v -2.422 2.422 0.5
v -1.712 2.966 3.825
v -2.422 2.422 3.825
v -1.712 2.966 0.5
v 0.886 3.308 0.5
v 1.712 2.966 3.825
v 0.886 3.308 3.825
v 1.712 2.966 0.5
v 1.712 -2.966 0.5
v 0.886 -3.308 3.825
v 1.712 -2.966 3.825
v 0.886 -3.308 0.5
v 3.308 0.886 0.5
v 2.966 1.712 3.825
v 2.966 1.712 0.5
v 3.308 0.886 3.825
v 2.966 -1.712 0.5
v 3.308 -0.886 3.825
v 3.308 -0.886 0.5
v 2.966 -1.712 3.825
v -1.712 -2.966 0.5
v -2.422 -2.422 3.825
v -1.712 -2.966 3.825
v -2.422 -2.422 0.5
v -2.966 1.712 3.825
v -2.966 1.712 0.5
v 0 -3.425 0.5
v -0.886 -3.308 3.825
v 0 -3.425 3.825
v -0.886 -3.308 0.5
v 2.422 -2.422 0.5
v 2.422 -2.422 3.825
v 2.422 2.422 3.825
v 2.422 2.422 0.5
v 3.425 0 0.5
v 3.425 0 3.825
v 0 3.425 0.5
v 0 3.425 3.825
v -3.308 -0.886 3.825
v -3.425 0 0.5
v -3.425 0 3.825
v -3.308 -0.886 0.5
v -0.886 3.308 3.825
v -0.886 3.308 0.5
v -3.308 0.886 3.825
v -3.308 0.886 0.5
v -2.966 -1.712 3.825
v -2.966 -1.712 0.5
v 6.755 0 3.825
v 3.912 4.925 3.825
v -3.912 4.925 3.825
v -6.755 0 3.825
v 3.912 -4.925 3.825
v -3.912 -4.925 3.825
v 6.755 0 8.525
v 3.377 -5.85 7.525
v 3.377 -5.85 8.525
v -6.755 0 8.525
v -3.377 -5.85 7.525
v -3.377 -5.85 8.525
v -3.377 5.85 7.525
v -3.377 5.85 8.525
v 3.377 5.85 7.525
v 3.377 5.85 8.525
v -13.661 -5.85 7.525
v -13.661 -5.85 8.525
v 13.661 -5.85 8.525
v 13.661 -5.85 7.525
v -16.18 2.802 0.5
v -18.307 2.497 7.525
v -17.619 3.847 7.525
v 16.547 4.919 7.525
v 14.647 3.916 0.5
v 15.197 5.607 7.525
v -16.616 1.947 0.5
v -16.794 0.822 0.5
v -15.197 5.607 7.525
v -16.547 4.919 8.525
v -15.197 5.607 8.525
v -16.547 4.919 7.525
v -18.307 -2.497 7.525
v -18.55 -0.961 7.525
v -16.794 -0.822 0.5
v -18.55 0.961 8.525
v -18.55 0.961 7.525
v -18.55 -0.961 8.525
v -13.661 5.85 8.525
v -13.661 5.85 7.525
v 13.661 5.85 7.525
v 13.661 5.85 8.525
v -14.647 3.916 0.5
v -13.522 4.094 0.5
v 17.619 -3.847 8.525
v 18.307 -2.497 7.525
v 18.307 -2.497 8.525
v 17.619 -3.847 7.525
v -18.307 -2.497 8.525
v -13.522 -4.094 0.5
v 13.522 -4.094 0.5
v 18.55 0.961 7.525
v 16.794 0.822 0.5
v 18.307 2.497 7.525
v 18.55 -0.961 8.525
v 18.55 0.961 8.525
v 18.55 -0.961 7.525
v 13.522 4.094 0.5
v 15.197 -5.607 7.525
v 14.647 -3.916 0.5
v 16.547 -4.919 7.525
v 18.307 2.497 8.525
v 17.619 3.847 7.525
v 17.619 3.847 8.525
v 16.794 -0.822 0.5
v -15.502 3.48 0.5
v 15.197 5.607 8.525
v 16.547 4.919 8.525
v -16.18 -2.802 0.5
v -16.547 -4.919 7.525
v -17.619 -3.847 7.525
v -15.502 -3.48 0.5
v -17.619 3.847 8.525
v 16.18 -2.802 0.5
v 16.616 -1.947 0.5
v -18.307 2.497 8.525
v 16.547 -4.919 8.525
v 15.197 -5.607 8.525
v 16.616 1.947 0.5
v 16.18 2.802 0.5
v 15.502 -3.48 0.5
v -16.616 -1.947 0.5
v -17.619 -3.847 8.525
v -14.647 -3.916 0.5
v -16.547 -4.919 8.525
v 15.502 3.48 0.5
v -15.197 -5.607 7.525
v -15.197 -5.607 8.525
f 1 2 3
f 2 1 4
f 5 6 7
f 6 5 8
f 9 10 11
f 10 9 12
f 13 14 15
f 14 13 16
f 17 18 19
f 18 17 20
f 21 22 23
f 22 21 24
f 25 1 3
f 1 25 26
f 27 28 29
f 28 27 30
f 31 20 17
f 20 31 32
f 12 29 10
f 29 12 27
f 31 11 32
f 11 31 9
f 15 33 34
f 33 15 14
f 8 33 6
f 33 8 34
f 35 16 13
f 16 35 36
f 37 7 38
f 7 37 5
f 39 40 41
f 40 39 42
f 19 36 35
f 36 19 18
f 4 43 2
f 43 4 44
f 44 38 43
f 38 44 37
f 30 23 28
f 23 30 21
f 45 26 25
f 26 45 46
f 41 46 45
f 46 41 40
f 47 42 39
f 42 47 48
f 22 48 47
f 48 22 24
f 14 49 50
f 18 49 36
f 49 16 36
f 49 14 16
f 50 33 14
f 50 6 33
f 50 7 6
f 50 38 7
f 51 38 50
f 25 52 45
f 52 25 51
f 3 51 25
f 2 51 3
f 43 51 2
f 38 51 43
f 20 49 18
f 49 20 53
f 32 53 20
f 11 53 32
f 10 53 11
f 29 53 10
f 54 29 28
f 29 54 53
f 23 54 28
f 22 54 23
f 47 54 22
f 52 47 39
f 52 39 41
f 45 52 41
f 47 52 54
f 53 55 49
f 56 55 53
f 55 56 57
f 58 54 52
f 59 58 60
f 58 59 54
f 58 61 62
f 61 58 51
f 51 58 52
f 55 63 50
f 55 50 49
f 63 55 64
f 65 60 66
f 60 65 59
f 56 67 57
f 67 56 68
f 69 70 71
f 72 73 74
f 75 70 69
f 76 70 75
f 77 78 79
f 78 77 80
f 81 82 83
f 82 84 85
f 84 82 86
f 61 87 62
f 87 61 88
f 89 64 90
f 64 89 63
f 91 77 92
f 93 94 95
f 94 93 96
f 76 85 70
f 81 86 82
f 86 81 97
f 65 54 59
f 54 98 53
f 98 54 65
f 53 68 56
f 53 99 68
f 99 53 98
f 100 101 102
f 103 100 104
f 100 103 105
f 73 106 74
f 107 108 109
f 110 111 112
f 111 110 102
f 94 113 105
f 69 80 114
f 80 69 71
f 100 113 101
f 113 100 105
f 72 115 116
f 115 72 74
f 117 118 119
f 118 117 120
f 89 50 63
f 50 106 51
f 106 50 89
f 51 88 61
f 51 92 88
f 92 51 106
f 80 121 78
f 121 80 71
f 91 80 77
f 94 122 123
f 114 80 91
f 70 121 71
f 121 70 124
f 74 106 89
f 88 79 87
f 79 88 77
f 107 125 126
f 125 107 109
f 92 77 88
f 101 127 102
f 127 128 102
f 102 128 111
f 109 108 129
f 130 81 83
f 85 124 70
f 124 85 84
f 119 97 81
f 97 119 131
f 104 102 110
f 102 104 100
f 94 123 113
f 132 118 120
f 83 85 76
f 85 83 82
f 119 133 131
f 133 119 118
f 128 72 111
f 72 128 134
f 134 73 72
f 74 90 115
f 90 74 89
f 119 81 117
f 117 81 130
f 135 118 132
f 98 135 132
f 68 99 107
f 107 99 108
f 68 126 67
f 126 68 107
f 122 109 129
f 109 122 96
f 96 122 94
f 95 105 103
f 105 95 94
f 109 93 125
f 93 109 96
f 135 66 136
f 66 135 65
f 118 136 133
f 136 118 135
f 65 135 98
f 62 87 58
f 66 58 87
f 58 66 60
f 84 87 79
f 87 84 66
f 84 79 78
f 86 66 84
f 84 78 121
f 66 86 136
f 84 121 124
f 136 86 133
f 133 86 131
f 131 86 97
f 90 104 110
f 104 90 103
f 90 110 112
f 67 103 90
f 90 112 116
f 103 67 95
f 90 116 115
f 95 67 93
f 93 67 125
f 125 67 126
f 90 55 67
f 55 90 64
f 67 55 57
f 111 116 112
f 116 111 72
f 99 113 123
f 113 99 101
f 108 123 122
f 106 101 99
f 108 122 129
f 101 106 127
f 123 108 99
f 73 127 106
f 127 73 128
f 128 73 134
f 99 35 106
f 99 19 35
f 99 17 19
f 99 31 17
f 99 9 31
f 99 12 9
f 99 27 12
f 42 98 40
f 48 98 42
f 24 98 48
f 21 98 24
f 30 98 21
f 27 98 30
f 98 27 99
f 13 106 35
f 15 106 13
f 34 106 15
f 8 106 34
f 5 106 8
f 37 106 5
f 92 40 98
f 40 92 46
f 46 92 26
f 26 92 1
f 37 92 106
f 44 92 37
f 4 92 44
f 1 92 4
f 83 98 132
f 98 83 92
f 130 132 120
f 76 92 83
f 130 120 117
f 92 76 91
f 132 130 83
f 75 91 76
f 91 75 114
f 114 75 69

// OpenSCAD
// file: ../lib/TOGMod1Constructors.scad
// TOGMod1Constructors-v1.11
// 
// Functions to construct objects understood by TOGMod1
// 
// v1.1:
// - Add togmod1_make_rounded_rect
// v1.2:
// - togmod1_make_rounded_rect can make ovals
// v1.3:
// - togmod1_circle_points, to just get the points of a circle
// - if pos parameter to circle function has a third element,
//   returned vertexes will include it as the z component;
// v1.3.1
// - Some assertions
// v1.4:
// - Refactor togmod1_rounded_rect_points and togmod1_circle_points
//   to use togmod1__make_nd_vector_adder for adapting to whatever
//   `pos` parameter is.
// v1.5:
// - togmod_rounded_rect_points will not simplify completely rounded sides
//   (where length of side is exactly twice the rounding radius)
//   unless simplify_rounded_sides=true
//   - This makes it more useful for polyhedron generation,
//     where radius varies, but number of points must remain constant.
// v1.6:
// - togmod1_make_rect makes a simple rectangle
// - togmod1_make_rounded_rect will defer to togmod1_make_rect when r=0
// v1.7:
// - togmod1_make_circle will return empty shape (["union"]) when d=0
// v1.8:
// - Add togmod1_text
// v1.9:
// - togmod1_circle_points uses 3 as minimum circle point count instead of 6
// v1.10:
// - Fix togmod1_linear_extrude_y so that range corresponds to Y start/end and
//   polygon X,Y correspond to X,Z.  Previously it was rotated wrongly,
//   which would have gone unnoticed for symmetrical shapes centered at 0,0.
// v1.11:
// - Remove an 'echo'

use <./TOGArrayLib1.scad>

function togmod1__make_nd_vector_adder(origin=[0,0]) =
	let(origin_is_zero = tal1_reduce(true, origin, function(prev,item) prev && item == 0))
	origin_is_zero ? (function(vec) len(vec) >= len(origin) ? vec : tal1_replace_at(origin, 0, vec)) :
	function(vec) [
		for(i=[0:1:max(len(origin),len(vec))-1]) (len(vec) > i ? vec[i] : 0) + (len(origin) > i ? origin[i] : 0),
	];

assert([1,2,3] == togmod1__make_nd_vector_adder()([1,2,3]));
assert([1,2,3] == togmod1__make_nd_vector_adder([0,0,3])([1,2]));


function togmod1_make_cuboid(size) =
	assert(is_list(size))
	assert(len(size) >= 3)
	assert(is_num(size[0]))
	assert(is_num(size[1]))
	assert(is_num(size[2]))
	["polyhedron-vf", [
		[-size[0]/2, -size[1]/2, -size[2]/2],
		[+size[0]/2, -size[1]/2, -size[2]/2],
		[-size[0]/2, +size[1]/2, -size[2]/2],
		[+size[0]/2, +size[1]/2, -size[2]/2],
		[-size[0]/2, -size[1]/2, +size[2]/2],
		[+size[0]/2, -size[1]/2, +size[2]/2],
		[-size[0]/2, +size[1]/2, +size[2]/2],
		[+size[0]/2, +size[1]/2, +size[2]/2]
	], [
		[0,1,3,2],[0,4,5,1],[4,6,7,5],[3,7,6,2],[1,5,7,3],[6,4,0,2]
	]];

function togmod1_make_polygon(verts) =
	["polygon-vp", verts, [[for( i=[0:1:len(verts)-1] ) i%len(verts)]]];

function togmod1_rounded_rect_points(size, r, pos=[0,0], simplify_rounded_sides=false) =
	assert(is_list(size))
	assert(len(size) >= 2)
	let(radii = is_list(r) ? r : is_num(r) ? [r,r] : assert(false, "rounded_rect r(adius) should be list<num> or num"))
	let(rx = radii[0])
	let(ry = radii[1])
	assert(is_num(rx))
	assert(is_num(ry))
	assert(size[0] >= 2*rx, str("size[0] must be >= 2*r[0]; size[0] = ",size[0],", 2*r[0] = ",2*rx))
	assert(size[1] >= 2*ry, str("size[1] must be >= 2*r[1]; size[1] = ",size[1],", 2*r[1] = ",2*ry))
	let(quarterfn=max($fn/4, 1))
	let(qfnx = simplify_rounded_sides && size[0] == 2*rx ? quarterfn-1 : quarterfn)
	let(qfny = simplify_rounded_sides && size[1] == 2*ry ? quarterfn-1 : quarterfn)
	let(finalizepos = togmod1__make_nd_vector_adder(pos))
[
	for(a=[0 : 1 : qfnx]) let(ang=      a*90/quarterfn) finalizepos([ size[0]/2-rx + rx*cos(ang),  size[1]/2-ry + ry*sin(ang)]),
	for(a=[0 : 1 : qfny]) let(ang= 90 + a*90/quarterfn) finalizepos([-size[0]/2+rx + rx*cos(ang),  size[1]/2-ry + ry*sin(ang)]),
	for(a=[0 : 1 : qfnx]) let(ang=180 + a*90/quarterfn) finalizepos([-size[0]/2+rx + rx*cos(ang), -size[1]/2+ry + ry*sin(ang)]),
	for(a=[0 : 1 : qfny]) let(ang=270 + a*90/quarterfn) finalizepos([ size[0]/2-rx + rx*cos(ang), -size[1]/2+ry + ry*sin(ang)]),
];

function togmod1_make_rect(size) =
	togmod1_make_polygon([
		[-size[0]/2, -size[1]/2],
		[+size[0]/2, -size[1]/2],
		[+size[0]/2, +size[1]/2],
		[-size[0]/2, +size[1]/2],
	]);

function togmod1_make_rounded_rect(size, r) =
	r == 0 ? togmod1_make_rect(size) :
	togmod1_make_polygon(togmod1_rounded_rect_points(size,r,simplify_rounded_sides=true));

/**
 * Returns points for an approximation of a circle where points are at distance r from pos.
 * Can be used to make other regular polygons, but the faces will be less than that
 * distance from pos (do some trig if you want face distance, e.g. for a hex nut).
 */
function togmod1_circle_points(r, pos=[0,0], d=undef) =
	assert( !is_undef(r) || !is_undef(d) )
	assert(!is_undef(pos[0]))
	assert(!is_undef(pos[1]))
	let(finalizepos = togmod1__make_nd_vector_adder(pos))
	let(r_ = !is_undef(r) ? r : d/2)
	let(fn = max($fn, 3))
	[for(i=[0 : 1 : fn-1]) finalizepos([r_*cos(i*360/fn), r_*sin(i*360/fn)])];

function togmod1_make_circle(r, pos=[0,0], d=undef) =
	r == 0 || d == 0 ? ["union"] :
	togmod1_make_polygon(togmod1_circle_points(r=r, pos=pos, d=d));

function togmod1_make_cylinder(d, zrange=[0,1], r=undef, pos=[0,0]) =
	assert( !is_undef(r) || !is_undef(d) )
	let( r_ = !is_undef(r) ? r : d/2 )
	// TODO: Make polyhedron directly
	["linear-extrude-zs", zrange, togmod1_make_circle(r=r_, pos=pos)];

function togmod1__is_range1d(range) = is_list(range) && len(range) == 2 && is_num(range[0]) && is_num(range[1]);

function togmod1_linear_extrude_z(range, shape) =
	assert(togmod1__is_range1d(range))
	["linear-extrude-zs", range, shape];
function togmod1_linear_extrude_x(range, shape) =
	assert(togmod1__is_range1d(range))
	["rotate", [90, 0, 90], togmod1_linear_extrude_z(range, shape)];
function togmod1_linear_extrude_y(range, shape) =
	assert(togmod1__is_range1d(range))
	["rotate", [90, 0,  0], togmod1_linear_extrude_z([-range[1], -range[0]], shape)];

function togmod1_text(text, size, font, halign, valign, spacing, direction, language, script) =
	["text-tsfhvsdls", text, size, font, halign, valign, spacing, direction, language, script];
// file: ../lib/TOGArrayLib1.scad
// TOGArrayLib1.5
// 
// Functions for working with arrays.
// 
// v1.1:
// - tal1_reduce assert(is_list(items)) to prevent infinite recursion
//   when given undefined or other non-list values
// v1.1.1:
// - Fix tal1_uniq_remap_v2 to return "list-remap-result" as the
//   first element of the returned list
// v1.2:
// - Add tal1_replace_at function
// v1.3:
// - tal1_is_vec_of, tal1_is_vec_of_num
// v1.4:
// - tal1_assert_for_each, for when you want to assert something
//   about each of a list of items and get nice failure messages
// v1.5:
// - Add tal1_duplicate_reversed function, which may be
//   handy when generating symmetrical polygons and stuff.

/**
 * Make a list with the contents of list `a`,
 * but starting at offset `off`, replaced by the contents of list `b`.
 * len(result) = max(len(a), off+len(b))
 */
function tal1_replace_at(a, off, b, default_value=undef, default_value_function=undef) =
	assert(is_list(a))
	assert(is_list(b))
	let( _dvf = !is_undef(default_value_function) ? default_value_function : function(i) default_value )
[
	for( i=[0:1:min(off,len(a))-1] ) a[i],
	for( i=[len(a):1:off-1] ) _dvf(i),
	for( i=[off:1:off+len(b)-1] ) b[i-off],
	for( i=[off+len(b):1:len(a)-1] ) a[i],
];

// Simplest case
assert([] == tal1_replace_at([], 0, []));
// Second simplest cases
assert(["foo"] == tal1_replace_at(["foo"], 0, []));
assert(["foo"] == tal1_replace_at([], 0, ["foo"]));
// Replace one item
assert(["foo","quux","baz"] == tal1_replace_at(["foo","bar","baz"], 1, ["quux"]));
// Replace and extend
assert(["foo","quux","tuna","tina"] == tal1_replace_at(["foo","bar","baz"], 1, ["quux", "tuna", "tina"]));
// Add beyond end of `a`
assert(["foo","zzz","quux"] == tal1_replace_at(["foo"], 2, ["quux"], default_value="zzz"));
// Adding 'nothing' should still fill to that point with defaults
assert(["foo","zzz","zzz"] == tal1_replace_at(["foo"], 3, [], default_value="zzz"));


function tal1_reduce(start, items, func, offset=0) =
	assert(is_list(items))
	len(items) == offset ? start :
	tal1_reduce(func(start, items[offset]), items, func, offset+1);

function tal1_consecutive_duplicate_count(items) = tal1_reduce(
	[0, undef],
	items,
	function(z,item) [z[0] + (item == z[1] ? 1 : 0), item]
)[0];

assert(0 == tal1_consecutive_duplicate_count([]));
assert(0 == tal1_consecutive_duplicate_count([50]));
assert(1 == tal1_consecutive_duplicate_count([50,50]));
assert(0 == tal1_consecutive_duplicate_count([50,51,52,53]));
assert(1 == tal1_consecutive_duplicate_count([50,51,52,52]));
assert(3 == tal1_consecutive_duplicate_count([50,50,50,50]));

// Set test_size to arbirarily large values
// to ensure that OpenSCAD can handle heavy recursion
let(test_size=1000) assert(test_size/2 == tal1_consecutive_duplicate_count([for(i=[0:1:test_size-1]) floor(i/2)]));



function tal1_uniq_(items, off0, off1) =
	let(chunklen = off1-off0)
	chunklen == 0 ? [] :
	chunklen == 1 ? [items[off0]] :
	let(half=floor(chunklen/2))
	let(left  = tal1_uniq_(items, off0     , off0+half))
	let(right = tal1_uniq_(items, off0+half, off1     ))
	assert(len(left) > 0)
	assert(len(right) > 0)
	left[len(left)-1] == right[0] ? [each left, for(i=[1:1:len(right)-1]) right[i]] :
	[each left, each right];

/** Given a list of items, returns a new list with identical consecutive items merged */
function tal1_uniq(items) = tal1_uniq_(items, 0, len(items));

assert([] == tal1_uniq([]));
assert([123] == tal1_uniq([123]));
assert([55,0,1,2,3] == tal1_uniq([55,0,1,2,3]));
assert([55,0,1,2] == tal1_uniq([55,0,1,1,2]));
assert([55,0,1] == tal1_uniq([55,55,0,0,0,0,0,0,1,1,1,1]));
assert([55,0] == tal1_uniq([55,0,0,0,0,0,0,0]));



/**
 * Returns [new items, old index -> new index mapping].
 * No-op version.
 */
function tal1_uniq_remap_v1(items) =
	["list-remap-result", items, [for (vi=[0:1:len(items)-1]) vi]];

// [a, a, b, b, c, c]
//
// [a,    ...], []  -> [a],[0]
// [a, a, ...], [0] -> [a],[0,0]

assert([1,2,3] == [1,2,3]);

/**
 * Recursive version that will combine adjacent identical vertexes,
 * but will use the original items.
 */
function tal1_uniq_remap_v2(items, map=[]) =
	let(index = len(map))
	len(items) == index ? ["list-remap-result", items, map] :
	index == 0 ? tal1_uniq_remap_v2(items, [0]) :
	items[index] == items[map[index-1]] ? tal1_uniq_remap_v2(items, [for(vi=map) vi, map[index-1]]) :
	tal1_uniq_remap_v2(items, [for(vi=map) vi, index]);

assert(tal1_uniq_remap_v2([1,1,2,2,3,4]) == ["list-remap-result", [1,1,2,2,3,4], [0,0,2,2,4,5]]);


/**
 * Returns true if `vec` is a list of at least min_len items
 * and component_check(each item, even those beyond min_len) is true.
 */
function tal1_is_vec_of(vec, min_len=0, component_check=function(x) true) =
	assert(is_num(min_len) && min_len >= 0)
	assert(is_function(component_check))
	is_list(vec) && len(vec) >= min_len &&
	tal1_reduce(true, vec, function(prev,item) prev && component_check(item));

function tal1_is_vec_of_num(vec, min_len=0) = tal1_is_vec_of(vec, min_len, function(i) is_num(i));

assert( true == tal1_is_vec_of_num([1,2,3]));
assert( true == tal1_is_vec_of_num([]));
assert( true == tal1_is_vec_of_num([1,2,3], 3));
assert(false == tal1_is_vec_of_num([1,2], 3));
assert(false == tal1_is_vec_of_num([1,2,"spoon"], 3));
// Requirements are ambiguous when
// first min_len items are numbers, but there are non-numeric items afterwards,
// so let's error on the side of saying 'no, it's not a list of numbers';
// i.e. the item check and the min_len are independent.
assert(false == tal1_is_vec_of_num([1,2,3,"artichoke"], 3));


/**
 * Asserts that item_checker(each item in list, index of item)[0] is true.
 * Second element of item_checker return value is assertion message.
 * Returns the original list, in case that's useful to you.
 */
function tal1_assert_for_each(list, item_checker) =
	let( _ignored = [ for(i=[0:1:len(list)-1])
		let(q=item_checker(list[i],i))
		let(passed=is_bool(q) ? q : is_list(q) ? q[0] : assert(false, str(
			"tal1_assert_for_each: item_checker should return Bool|[Bool,String], but returned ",
			q, " for item at index ", i)))
		let(message=is_list(q) ? q[1] : undef)
		assert(passed, message)
		q
	])
	list;

// Callback can return a boolean...
assert([1,2,3] == tal1_assert_for_each([1,2,3], function(v,i) is_num(v)));
// ...or a [boolean, string]
assert([1,2,3] == tal1_assert_for_each([1,2,3], function(v,i) [is_num(v), "element be a num"]));

// [a, b, c] -> [a, b, c, rxf(c), rxf(b), rxf(a)]
function tal1_duplicate_reversed(list, rxf=function(item) item) =
	[
		each list,
		for( i=[len(list)-1 : -1 : 0] ) rxf(list[i]),
	];
// file: ../lib/TOGComplexLib1.scad
function tcplx1_multiply(a, b) =
	[a[0]*b[0] - a[1]*b[1], a[0]*b[1] + a[1]*b[0]];
function tcplx1_divide(a, b) =
	let(bot = (b[0]*b[0] + b[1]*b[1]))
	[
		(a[0]*b[0] + a[1]*b[1])/bot,
		(a[1]*b[0] - a[0]*b[1])/bot
	];

assert([-11,23] == tcplx1_multiply([3,2], [1,7]));

assert([-1,3] == tcplx1_multiply([3,1], [0,1]));
assert([-1,3] == tcplx1_multiply([0,1], [3,1]));

echo(tcplx1_divide([-1,3], [3,1]));
assert([0,1] == tcplx1_divide([-1,3], [3,1]));

function tcplx1_normalize(vec) =
	let(veclen = sqrt(vec[0]*vec[0]+vec[1]*vec[1]))
	[vec[0] / veclen, vec[1] / veclen];

function tcplx1_relative_turnvec_vv(v0, v1) =
	tcplx1_divide(tcplx1_normalize(v1), tcplx1_normalize(v0));

function tcplx1_relative_turnvec_abc(p0, p1, p2) = tcplx1_relative_turnvec_vv(p1-p0, p2-p1);

// A 90-degree turn
assert([0,1] == tcplx1_relative_turnvec_abc([0,0], [1,0], [1,1]));
assert([0,1] == tcplx1_relative_turnvec_abc([0,0], [0,1], [-1,1]));

// A 45-degree turn
assert(tcplx1_normalize([1,1]) == tcplx1_relative_turnvec_abc([0,0], [1,0], [ 2,1]));
assert(tcplx1_normalize([1,1]) == tcplx1_relative_turnvec_abc([0,0], [0,1], [-1,2]));


function tcplx1_relative_angle_abc(p0, p1, p2) =
	let(turnvec = tcplx1_relative_turnvec_abc(p0, p1, p2))
	atan2(turnvec[1], turnvec[0]);

assert(-135 == tcplx1_relative_angle_abc([0,0], [1,0], [0,-1]));
assert( -90 == tcplx1_relative_angle_abc([0,0], [1,0], [1,-1]));
assert(   0 == tcplx1_relative_angle_abc([0,0], [1,0], [2, 0]));
assert(  90 == tcplx1_relative_angle_abc([0,0], [1,0], [1, 1]));
assert( 135 == tcplx1_relative_angle_abc([0,0], [1,0], [0, 1]));

assert(  90 == tcplx1_relative_angle_abc([1,1], [3,3], [1, 5]));
// file: ../lib/TOGMod1.scad
// TOGMod1.9
// OpenSCAD library for representing shapes
// 
// See also: Functional OpenSCAD (https://github.com/thehans/FunctionalOpenSCAD)
// 
// v1.8:
// - Add `text-tsfhvsdls`
// v1.9
// - Add `offset-ds` (offset with _d_elta a _s_hape)

module togmod1_domodule(mod) {
	assert(is_list(mod));
	assert(len(mod) > 0);
	if( mod[0] == "polygon-vp" ) {
		// ["polygon-vp", vertexes, paths]
		polygon(points=mod[1], paths=mod[2]);
	} else if( mod[0] == "polyhedron-vf" ) {
		polyhedron(mod[1], faces=mod[2]);
	} else if( mod[0] == "scale" ) {
		assert(len(mod) == 3);
		scale(mod[1]) togmod1_domodule(mod[2]);
	} else if( mod[0] == "translate" ) {
		assert(len(mod) == 3);
		assert(is_list(mod[1]));
		for(c=mod[1]) assert(is_num(c), "translate component should be numeric");
		translate(mod[1]) togmod1_domodule(mod[2]);
	} else if( mod[0] == "rotate" ) {
		assert(len(mod) == 3);
		rotate(mod[1]) togmod1_domodule(mod[2]);
	} else if( mod[0] == "intersection" ) {
		intersection_for( i=[1:1:len(mod)-1] ) togmod1_domodule(mod[i]);
	} else if( mod[0] == "difference" ) {
		difference() {
			togmod1_domodule(mod[1]);
			for( i=[2:1:len(mod)-1] ) togmod1_domodule(mod[i]);
		}
	} else if( mod[0] == "union" ) {
		for( i=[1:1:len(mod)-1] ) togmod1_domodule(mod[i]);
	} else if( mod[0] == "hull" ) {
		hull() for( i=[1:1:len(mod)-1] ) togmod1_domodule(mod[i]);
	} else if( mod[0] == "offset-rs" ) {
		assert(len(mod) == 3);
		assert(is_num(mod[1]));
		assert(is_list(mod[2]));
		offset(mod[1]) togmod1_domodule(mod[2]);
	} else if( mod[0] == "linear-extrude-zs" ) {
		// ["linear-extrude-zs", [z0,z1], 2d_shape] // centered
		// ["linear-extrude-zs", height, 2d_shape]
		let( zrange = is_list(mod[1]) ? mod[1] : [-mod[1]/2, mod[1]/2] ) {
			translate([0,0,zrange[0]]) linear_extrude(zrange[1]-zrange[0]) togmod1_domodule(mod[2]);
		}
	} else if( mod[0] == "render" ) {
		render() togmod1_domodule(mod[1]);
	} else if( mod[0] == "minkowski" ) {
		minkowski() {
			togmod1_domodule(mod[1]);
			togmod1_domodule(mod[2]);
		}
	} else if( mod[0] == "x-debug" ) {
		# togmod1_domodule(mod[1]);
	} else if( mod[0] == "x-color" ) {
		color(mod[1]) togmod1_domodule(mod[2]);
	} else if( mod[0] == "text-tsfhvsdls" ) {
		text(text=mod[1], size=mod[2], font=mod[3], halign=mod[4], valign=mod[5], spacing=mod[6], direction=mod[7], language=mod[7], script=mod[8]);
	} else if( mod[0] == "offset-ds" ) {
		assert(is_num(mod[1]));
		assert(is_list(mod[2]));
		offset(delta=mod[1]) togmod1_domodule(mod[2]);
	} else {
		assert(false, str("Unrecognized shape: ", mod[0]));
	}
}
// main file
// MatchfitHexHeadNut-v1.2.1
//
// Long 'nut' that fits into a matchfit dovetail slot,
// with a hole for a standard 1/4" bolt head
//
// Matchfit dovetail slots are 3/8" deep, bottom 1/2" wide at the bottom,
// with sides 14deg from vertical.  The top corners are usually rounded
// a bit; otherwise the slot would be top would be 5/16" wide.
// tan(14deg) = 1/4, so the walls slope inwards at dx/dy=1/4.
// 
// v1.1:
// - Default bottom_margin reduced to 0.5mm,
//   hex_head_diameter increased by 0.4mm
// v1.2:
// - Make hex_head_depth configurable,
//   default to 4.7mm
// v1.2.1:
// - Add some documentation

bottom_margin     =  0.5; // 0.1
top_margin        =  1.0; // 0.1
hex_head_diameter = 11.7; // 0.1
hex_head_depth    =  4.7; // 0.1

inch = 25.4;
hole_diameter = 1/4*inch + 0.5;

use <../lib/TOGMod1.scad>
use <../lib/TOGPath1.scad>
use <../lib/TOGPolyhedronLib1.scad>

$fn = 24;

z0 = bottom_margin;
z2 = 3/8*inch - top_margin;
z1 = z2 - 1;

function nut_hull() = tphl1_make_polyhedron_from_layer_function([
	[z0, -3/32*inch + (z0*0.25)],
	[z1, 0 - (3/8*inch - z1)*0.25],
	[z2, 0 - (3/8*inch - z1)*0.25],
],
	function(params)
	let(z=params[0])
	let(offset=params[1])
	[ for( p = togpath1_rath_to_points(["togpath1-rath",
		["togpath1-rathnode", [-3/4*inch, -1/4*inch], ["round", 1/4*inch-1], ["offset", offset]],
		["togpath1-rathnode", [ 3/4*inch, -1/4*inch], ["round", 1/4*inch-1], ["offset", offset]],
		["togpath1-rathnode", [ 3/4*inch,  1/4*inch], ["round", 1/4*inch-1], ["offset", offset]],
		["togpath1-rathnode", [-3/4*inch,  1/4*inch], ["round", 1/4*inch-1], ["offset", offset]],
	])) [p[0], p[1], z] ]
);

function head_hole() = ["union",
	tphl1_make_z_cylinder(d=hole_diameter, zrange=[-1, 3/8*inch+1]),
	tphl1_extrude_polypoints([z2-hex_head_depth, z2+1], [
		[-hex_head_diameter/cos(30)/2, 0],
		[                           0, -hex_head_diameter/cos(60)/2],
		[+hex_head_diameter/cos(30)/2, 0],
		[                           0, +hex_head_diameter/cos(60)/2],
	]),
	// tphl1_make_z_cylinder(d=hex_head_diameter/cos(30), zrange=[3/8*inch-5, 3/8*inch+1], $fn=6), // (cos (* pi 2 (/ 30 360.0)))
];

togmod1_domodule(["difference",
	nut_hull(),
	head_hole()
]);
